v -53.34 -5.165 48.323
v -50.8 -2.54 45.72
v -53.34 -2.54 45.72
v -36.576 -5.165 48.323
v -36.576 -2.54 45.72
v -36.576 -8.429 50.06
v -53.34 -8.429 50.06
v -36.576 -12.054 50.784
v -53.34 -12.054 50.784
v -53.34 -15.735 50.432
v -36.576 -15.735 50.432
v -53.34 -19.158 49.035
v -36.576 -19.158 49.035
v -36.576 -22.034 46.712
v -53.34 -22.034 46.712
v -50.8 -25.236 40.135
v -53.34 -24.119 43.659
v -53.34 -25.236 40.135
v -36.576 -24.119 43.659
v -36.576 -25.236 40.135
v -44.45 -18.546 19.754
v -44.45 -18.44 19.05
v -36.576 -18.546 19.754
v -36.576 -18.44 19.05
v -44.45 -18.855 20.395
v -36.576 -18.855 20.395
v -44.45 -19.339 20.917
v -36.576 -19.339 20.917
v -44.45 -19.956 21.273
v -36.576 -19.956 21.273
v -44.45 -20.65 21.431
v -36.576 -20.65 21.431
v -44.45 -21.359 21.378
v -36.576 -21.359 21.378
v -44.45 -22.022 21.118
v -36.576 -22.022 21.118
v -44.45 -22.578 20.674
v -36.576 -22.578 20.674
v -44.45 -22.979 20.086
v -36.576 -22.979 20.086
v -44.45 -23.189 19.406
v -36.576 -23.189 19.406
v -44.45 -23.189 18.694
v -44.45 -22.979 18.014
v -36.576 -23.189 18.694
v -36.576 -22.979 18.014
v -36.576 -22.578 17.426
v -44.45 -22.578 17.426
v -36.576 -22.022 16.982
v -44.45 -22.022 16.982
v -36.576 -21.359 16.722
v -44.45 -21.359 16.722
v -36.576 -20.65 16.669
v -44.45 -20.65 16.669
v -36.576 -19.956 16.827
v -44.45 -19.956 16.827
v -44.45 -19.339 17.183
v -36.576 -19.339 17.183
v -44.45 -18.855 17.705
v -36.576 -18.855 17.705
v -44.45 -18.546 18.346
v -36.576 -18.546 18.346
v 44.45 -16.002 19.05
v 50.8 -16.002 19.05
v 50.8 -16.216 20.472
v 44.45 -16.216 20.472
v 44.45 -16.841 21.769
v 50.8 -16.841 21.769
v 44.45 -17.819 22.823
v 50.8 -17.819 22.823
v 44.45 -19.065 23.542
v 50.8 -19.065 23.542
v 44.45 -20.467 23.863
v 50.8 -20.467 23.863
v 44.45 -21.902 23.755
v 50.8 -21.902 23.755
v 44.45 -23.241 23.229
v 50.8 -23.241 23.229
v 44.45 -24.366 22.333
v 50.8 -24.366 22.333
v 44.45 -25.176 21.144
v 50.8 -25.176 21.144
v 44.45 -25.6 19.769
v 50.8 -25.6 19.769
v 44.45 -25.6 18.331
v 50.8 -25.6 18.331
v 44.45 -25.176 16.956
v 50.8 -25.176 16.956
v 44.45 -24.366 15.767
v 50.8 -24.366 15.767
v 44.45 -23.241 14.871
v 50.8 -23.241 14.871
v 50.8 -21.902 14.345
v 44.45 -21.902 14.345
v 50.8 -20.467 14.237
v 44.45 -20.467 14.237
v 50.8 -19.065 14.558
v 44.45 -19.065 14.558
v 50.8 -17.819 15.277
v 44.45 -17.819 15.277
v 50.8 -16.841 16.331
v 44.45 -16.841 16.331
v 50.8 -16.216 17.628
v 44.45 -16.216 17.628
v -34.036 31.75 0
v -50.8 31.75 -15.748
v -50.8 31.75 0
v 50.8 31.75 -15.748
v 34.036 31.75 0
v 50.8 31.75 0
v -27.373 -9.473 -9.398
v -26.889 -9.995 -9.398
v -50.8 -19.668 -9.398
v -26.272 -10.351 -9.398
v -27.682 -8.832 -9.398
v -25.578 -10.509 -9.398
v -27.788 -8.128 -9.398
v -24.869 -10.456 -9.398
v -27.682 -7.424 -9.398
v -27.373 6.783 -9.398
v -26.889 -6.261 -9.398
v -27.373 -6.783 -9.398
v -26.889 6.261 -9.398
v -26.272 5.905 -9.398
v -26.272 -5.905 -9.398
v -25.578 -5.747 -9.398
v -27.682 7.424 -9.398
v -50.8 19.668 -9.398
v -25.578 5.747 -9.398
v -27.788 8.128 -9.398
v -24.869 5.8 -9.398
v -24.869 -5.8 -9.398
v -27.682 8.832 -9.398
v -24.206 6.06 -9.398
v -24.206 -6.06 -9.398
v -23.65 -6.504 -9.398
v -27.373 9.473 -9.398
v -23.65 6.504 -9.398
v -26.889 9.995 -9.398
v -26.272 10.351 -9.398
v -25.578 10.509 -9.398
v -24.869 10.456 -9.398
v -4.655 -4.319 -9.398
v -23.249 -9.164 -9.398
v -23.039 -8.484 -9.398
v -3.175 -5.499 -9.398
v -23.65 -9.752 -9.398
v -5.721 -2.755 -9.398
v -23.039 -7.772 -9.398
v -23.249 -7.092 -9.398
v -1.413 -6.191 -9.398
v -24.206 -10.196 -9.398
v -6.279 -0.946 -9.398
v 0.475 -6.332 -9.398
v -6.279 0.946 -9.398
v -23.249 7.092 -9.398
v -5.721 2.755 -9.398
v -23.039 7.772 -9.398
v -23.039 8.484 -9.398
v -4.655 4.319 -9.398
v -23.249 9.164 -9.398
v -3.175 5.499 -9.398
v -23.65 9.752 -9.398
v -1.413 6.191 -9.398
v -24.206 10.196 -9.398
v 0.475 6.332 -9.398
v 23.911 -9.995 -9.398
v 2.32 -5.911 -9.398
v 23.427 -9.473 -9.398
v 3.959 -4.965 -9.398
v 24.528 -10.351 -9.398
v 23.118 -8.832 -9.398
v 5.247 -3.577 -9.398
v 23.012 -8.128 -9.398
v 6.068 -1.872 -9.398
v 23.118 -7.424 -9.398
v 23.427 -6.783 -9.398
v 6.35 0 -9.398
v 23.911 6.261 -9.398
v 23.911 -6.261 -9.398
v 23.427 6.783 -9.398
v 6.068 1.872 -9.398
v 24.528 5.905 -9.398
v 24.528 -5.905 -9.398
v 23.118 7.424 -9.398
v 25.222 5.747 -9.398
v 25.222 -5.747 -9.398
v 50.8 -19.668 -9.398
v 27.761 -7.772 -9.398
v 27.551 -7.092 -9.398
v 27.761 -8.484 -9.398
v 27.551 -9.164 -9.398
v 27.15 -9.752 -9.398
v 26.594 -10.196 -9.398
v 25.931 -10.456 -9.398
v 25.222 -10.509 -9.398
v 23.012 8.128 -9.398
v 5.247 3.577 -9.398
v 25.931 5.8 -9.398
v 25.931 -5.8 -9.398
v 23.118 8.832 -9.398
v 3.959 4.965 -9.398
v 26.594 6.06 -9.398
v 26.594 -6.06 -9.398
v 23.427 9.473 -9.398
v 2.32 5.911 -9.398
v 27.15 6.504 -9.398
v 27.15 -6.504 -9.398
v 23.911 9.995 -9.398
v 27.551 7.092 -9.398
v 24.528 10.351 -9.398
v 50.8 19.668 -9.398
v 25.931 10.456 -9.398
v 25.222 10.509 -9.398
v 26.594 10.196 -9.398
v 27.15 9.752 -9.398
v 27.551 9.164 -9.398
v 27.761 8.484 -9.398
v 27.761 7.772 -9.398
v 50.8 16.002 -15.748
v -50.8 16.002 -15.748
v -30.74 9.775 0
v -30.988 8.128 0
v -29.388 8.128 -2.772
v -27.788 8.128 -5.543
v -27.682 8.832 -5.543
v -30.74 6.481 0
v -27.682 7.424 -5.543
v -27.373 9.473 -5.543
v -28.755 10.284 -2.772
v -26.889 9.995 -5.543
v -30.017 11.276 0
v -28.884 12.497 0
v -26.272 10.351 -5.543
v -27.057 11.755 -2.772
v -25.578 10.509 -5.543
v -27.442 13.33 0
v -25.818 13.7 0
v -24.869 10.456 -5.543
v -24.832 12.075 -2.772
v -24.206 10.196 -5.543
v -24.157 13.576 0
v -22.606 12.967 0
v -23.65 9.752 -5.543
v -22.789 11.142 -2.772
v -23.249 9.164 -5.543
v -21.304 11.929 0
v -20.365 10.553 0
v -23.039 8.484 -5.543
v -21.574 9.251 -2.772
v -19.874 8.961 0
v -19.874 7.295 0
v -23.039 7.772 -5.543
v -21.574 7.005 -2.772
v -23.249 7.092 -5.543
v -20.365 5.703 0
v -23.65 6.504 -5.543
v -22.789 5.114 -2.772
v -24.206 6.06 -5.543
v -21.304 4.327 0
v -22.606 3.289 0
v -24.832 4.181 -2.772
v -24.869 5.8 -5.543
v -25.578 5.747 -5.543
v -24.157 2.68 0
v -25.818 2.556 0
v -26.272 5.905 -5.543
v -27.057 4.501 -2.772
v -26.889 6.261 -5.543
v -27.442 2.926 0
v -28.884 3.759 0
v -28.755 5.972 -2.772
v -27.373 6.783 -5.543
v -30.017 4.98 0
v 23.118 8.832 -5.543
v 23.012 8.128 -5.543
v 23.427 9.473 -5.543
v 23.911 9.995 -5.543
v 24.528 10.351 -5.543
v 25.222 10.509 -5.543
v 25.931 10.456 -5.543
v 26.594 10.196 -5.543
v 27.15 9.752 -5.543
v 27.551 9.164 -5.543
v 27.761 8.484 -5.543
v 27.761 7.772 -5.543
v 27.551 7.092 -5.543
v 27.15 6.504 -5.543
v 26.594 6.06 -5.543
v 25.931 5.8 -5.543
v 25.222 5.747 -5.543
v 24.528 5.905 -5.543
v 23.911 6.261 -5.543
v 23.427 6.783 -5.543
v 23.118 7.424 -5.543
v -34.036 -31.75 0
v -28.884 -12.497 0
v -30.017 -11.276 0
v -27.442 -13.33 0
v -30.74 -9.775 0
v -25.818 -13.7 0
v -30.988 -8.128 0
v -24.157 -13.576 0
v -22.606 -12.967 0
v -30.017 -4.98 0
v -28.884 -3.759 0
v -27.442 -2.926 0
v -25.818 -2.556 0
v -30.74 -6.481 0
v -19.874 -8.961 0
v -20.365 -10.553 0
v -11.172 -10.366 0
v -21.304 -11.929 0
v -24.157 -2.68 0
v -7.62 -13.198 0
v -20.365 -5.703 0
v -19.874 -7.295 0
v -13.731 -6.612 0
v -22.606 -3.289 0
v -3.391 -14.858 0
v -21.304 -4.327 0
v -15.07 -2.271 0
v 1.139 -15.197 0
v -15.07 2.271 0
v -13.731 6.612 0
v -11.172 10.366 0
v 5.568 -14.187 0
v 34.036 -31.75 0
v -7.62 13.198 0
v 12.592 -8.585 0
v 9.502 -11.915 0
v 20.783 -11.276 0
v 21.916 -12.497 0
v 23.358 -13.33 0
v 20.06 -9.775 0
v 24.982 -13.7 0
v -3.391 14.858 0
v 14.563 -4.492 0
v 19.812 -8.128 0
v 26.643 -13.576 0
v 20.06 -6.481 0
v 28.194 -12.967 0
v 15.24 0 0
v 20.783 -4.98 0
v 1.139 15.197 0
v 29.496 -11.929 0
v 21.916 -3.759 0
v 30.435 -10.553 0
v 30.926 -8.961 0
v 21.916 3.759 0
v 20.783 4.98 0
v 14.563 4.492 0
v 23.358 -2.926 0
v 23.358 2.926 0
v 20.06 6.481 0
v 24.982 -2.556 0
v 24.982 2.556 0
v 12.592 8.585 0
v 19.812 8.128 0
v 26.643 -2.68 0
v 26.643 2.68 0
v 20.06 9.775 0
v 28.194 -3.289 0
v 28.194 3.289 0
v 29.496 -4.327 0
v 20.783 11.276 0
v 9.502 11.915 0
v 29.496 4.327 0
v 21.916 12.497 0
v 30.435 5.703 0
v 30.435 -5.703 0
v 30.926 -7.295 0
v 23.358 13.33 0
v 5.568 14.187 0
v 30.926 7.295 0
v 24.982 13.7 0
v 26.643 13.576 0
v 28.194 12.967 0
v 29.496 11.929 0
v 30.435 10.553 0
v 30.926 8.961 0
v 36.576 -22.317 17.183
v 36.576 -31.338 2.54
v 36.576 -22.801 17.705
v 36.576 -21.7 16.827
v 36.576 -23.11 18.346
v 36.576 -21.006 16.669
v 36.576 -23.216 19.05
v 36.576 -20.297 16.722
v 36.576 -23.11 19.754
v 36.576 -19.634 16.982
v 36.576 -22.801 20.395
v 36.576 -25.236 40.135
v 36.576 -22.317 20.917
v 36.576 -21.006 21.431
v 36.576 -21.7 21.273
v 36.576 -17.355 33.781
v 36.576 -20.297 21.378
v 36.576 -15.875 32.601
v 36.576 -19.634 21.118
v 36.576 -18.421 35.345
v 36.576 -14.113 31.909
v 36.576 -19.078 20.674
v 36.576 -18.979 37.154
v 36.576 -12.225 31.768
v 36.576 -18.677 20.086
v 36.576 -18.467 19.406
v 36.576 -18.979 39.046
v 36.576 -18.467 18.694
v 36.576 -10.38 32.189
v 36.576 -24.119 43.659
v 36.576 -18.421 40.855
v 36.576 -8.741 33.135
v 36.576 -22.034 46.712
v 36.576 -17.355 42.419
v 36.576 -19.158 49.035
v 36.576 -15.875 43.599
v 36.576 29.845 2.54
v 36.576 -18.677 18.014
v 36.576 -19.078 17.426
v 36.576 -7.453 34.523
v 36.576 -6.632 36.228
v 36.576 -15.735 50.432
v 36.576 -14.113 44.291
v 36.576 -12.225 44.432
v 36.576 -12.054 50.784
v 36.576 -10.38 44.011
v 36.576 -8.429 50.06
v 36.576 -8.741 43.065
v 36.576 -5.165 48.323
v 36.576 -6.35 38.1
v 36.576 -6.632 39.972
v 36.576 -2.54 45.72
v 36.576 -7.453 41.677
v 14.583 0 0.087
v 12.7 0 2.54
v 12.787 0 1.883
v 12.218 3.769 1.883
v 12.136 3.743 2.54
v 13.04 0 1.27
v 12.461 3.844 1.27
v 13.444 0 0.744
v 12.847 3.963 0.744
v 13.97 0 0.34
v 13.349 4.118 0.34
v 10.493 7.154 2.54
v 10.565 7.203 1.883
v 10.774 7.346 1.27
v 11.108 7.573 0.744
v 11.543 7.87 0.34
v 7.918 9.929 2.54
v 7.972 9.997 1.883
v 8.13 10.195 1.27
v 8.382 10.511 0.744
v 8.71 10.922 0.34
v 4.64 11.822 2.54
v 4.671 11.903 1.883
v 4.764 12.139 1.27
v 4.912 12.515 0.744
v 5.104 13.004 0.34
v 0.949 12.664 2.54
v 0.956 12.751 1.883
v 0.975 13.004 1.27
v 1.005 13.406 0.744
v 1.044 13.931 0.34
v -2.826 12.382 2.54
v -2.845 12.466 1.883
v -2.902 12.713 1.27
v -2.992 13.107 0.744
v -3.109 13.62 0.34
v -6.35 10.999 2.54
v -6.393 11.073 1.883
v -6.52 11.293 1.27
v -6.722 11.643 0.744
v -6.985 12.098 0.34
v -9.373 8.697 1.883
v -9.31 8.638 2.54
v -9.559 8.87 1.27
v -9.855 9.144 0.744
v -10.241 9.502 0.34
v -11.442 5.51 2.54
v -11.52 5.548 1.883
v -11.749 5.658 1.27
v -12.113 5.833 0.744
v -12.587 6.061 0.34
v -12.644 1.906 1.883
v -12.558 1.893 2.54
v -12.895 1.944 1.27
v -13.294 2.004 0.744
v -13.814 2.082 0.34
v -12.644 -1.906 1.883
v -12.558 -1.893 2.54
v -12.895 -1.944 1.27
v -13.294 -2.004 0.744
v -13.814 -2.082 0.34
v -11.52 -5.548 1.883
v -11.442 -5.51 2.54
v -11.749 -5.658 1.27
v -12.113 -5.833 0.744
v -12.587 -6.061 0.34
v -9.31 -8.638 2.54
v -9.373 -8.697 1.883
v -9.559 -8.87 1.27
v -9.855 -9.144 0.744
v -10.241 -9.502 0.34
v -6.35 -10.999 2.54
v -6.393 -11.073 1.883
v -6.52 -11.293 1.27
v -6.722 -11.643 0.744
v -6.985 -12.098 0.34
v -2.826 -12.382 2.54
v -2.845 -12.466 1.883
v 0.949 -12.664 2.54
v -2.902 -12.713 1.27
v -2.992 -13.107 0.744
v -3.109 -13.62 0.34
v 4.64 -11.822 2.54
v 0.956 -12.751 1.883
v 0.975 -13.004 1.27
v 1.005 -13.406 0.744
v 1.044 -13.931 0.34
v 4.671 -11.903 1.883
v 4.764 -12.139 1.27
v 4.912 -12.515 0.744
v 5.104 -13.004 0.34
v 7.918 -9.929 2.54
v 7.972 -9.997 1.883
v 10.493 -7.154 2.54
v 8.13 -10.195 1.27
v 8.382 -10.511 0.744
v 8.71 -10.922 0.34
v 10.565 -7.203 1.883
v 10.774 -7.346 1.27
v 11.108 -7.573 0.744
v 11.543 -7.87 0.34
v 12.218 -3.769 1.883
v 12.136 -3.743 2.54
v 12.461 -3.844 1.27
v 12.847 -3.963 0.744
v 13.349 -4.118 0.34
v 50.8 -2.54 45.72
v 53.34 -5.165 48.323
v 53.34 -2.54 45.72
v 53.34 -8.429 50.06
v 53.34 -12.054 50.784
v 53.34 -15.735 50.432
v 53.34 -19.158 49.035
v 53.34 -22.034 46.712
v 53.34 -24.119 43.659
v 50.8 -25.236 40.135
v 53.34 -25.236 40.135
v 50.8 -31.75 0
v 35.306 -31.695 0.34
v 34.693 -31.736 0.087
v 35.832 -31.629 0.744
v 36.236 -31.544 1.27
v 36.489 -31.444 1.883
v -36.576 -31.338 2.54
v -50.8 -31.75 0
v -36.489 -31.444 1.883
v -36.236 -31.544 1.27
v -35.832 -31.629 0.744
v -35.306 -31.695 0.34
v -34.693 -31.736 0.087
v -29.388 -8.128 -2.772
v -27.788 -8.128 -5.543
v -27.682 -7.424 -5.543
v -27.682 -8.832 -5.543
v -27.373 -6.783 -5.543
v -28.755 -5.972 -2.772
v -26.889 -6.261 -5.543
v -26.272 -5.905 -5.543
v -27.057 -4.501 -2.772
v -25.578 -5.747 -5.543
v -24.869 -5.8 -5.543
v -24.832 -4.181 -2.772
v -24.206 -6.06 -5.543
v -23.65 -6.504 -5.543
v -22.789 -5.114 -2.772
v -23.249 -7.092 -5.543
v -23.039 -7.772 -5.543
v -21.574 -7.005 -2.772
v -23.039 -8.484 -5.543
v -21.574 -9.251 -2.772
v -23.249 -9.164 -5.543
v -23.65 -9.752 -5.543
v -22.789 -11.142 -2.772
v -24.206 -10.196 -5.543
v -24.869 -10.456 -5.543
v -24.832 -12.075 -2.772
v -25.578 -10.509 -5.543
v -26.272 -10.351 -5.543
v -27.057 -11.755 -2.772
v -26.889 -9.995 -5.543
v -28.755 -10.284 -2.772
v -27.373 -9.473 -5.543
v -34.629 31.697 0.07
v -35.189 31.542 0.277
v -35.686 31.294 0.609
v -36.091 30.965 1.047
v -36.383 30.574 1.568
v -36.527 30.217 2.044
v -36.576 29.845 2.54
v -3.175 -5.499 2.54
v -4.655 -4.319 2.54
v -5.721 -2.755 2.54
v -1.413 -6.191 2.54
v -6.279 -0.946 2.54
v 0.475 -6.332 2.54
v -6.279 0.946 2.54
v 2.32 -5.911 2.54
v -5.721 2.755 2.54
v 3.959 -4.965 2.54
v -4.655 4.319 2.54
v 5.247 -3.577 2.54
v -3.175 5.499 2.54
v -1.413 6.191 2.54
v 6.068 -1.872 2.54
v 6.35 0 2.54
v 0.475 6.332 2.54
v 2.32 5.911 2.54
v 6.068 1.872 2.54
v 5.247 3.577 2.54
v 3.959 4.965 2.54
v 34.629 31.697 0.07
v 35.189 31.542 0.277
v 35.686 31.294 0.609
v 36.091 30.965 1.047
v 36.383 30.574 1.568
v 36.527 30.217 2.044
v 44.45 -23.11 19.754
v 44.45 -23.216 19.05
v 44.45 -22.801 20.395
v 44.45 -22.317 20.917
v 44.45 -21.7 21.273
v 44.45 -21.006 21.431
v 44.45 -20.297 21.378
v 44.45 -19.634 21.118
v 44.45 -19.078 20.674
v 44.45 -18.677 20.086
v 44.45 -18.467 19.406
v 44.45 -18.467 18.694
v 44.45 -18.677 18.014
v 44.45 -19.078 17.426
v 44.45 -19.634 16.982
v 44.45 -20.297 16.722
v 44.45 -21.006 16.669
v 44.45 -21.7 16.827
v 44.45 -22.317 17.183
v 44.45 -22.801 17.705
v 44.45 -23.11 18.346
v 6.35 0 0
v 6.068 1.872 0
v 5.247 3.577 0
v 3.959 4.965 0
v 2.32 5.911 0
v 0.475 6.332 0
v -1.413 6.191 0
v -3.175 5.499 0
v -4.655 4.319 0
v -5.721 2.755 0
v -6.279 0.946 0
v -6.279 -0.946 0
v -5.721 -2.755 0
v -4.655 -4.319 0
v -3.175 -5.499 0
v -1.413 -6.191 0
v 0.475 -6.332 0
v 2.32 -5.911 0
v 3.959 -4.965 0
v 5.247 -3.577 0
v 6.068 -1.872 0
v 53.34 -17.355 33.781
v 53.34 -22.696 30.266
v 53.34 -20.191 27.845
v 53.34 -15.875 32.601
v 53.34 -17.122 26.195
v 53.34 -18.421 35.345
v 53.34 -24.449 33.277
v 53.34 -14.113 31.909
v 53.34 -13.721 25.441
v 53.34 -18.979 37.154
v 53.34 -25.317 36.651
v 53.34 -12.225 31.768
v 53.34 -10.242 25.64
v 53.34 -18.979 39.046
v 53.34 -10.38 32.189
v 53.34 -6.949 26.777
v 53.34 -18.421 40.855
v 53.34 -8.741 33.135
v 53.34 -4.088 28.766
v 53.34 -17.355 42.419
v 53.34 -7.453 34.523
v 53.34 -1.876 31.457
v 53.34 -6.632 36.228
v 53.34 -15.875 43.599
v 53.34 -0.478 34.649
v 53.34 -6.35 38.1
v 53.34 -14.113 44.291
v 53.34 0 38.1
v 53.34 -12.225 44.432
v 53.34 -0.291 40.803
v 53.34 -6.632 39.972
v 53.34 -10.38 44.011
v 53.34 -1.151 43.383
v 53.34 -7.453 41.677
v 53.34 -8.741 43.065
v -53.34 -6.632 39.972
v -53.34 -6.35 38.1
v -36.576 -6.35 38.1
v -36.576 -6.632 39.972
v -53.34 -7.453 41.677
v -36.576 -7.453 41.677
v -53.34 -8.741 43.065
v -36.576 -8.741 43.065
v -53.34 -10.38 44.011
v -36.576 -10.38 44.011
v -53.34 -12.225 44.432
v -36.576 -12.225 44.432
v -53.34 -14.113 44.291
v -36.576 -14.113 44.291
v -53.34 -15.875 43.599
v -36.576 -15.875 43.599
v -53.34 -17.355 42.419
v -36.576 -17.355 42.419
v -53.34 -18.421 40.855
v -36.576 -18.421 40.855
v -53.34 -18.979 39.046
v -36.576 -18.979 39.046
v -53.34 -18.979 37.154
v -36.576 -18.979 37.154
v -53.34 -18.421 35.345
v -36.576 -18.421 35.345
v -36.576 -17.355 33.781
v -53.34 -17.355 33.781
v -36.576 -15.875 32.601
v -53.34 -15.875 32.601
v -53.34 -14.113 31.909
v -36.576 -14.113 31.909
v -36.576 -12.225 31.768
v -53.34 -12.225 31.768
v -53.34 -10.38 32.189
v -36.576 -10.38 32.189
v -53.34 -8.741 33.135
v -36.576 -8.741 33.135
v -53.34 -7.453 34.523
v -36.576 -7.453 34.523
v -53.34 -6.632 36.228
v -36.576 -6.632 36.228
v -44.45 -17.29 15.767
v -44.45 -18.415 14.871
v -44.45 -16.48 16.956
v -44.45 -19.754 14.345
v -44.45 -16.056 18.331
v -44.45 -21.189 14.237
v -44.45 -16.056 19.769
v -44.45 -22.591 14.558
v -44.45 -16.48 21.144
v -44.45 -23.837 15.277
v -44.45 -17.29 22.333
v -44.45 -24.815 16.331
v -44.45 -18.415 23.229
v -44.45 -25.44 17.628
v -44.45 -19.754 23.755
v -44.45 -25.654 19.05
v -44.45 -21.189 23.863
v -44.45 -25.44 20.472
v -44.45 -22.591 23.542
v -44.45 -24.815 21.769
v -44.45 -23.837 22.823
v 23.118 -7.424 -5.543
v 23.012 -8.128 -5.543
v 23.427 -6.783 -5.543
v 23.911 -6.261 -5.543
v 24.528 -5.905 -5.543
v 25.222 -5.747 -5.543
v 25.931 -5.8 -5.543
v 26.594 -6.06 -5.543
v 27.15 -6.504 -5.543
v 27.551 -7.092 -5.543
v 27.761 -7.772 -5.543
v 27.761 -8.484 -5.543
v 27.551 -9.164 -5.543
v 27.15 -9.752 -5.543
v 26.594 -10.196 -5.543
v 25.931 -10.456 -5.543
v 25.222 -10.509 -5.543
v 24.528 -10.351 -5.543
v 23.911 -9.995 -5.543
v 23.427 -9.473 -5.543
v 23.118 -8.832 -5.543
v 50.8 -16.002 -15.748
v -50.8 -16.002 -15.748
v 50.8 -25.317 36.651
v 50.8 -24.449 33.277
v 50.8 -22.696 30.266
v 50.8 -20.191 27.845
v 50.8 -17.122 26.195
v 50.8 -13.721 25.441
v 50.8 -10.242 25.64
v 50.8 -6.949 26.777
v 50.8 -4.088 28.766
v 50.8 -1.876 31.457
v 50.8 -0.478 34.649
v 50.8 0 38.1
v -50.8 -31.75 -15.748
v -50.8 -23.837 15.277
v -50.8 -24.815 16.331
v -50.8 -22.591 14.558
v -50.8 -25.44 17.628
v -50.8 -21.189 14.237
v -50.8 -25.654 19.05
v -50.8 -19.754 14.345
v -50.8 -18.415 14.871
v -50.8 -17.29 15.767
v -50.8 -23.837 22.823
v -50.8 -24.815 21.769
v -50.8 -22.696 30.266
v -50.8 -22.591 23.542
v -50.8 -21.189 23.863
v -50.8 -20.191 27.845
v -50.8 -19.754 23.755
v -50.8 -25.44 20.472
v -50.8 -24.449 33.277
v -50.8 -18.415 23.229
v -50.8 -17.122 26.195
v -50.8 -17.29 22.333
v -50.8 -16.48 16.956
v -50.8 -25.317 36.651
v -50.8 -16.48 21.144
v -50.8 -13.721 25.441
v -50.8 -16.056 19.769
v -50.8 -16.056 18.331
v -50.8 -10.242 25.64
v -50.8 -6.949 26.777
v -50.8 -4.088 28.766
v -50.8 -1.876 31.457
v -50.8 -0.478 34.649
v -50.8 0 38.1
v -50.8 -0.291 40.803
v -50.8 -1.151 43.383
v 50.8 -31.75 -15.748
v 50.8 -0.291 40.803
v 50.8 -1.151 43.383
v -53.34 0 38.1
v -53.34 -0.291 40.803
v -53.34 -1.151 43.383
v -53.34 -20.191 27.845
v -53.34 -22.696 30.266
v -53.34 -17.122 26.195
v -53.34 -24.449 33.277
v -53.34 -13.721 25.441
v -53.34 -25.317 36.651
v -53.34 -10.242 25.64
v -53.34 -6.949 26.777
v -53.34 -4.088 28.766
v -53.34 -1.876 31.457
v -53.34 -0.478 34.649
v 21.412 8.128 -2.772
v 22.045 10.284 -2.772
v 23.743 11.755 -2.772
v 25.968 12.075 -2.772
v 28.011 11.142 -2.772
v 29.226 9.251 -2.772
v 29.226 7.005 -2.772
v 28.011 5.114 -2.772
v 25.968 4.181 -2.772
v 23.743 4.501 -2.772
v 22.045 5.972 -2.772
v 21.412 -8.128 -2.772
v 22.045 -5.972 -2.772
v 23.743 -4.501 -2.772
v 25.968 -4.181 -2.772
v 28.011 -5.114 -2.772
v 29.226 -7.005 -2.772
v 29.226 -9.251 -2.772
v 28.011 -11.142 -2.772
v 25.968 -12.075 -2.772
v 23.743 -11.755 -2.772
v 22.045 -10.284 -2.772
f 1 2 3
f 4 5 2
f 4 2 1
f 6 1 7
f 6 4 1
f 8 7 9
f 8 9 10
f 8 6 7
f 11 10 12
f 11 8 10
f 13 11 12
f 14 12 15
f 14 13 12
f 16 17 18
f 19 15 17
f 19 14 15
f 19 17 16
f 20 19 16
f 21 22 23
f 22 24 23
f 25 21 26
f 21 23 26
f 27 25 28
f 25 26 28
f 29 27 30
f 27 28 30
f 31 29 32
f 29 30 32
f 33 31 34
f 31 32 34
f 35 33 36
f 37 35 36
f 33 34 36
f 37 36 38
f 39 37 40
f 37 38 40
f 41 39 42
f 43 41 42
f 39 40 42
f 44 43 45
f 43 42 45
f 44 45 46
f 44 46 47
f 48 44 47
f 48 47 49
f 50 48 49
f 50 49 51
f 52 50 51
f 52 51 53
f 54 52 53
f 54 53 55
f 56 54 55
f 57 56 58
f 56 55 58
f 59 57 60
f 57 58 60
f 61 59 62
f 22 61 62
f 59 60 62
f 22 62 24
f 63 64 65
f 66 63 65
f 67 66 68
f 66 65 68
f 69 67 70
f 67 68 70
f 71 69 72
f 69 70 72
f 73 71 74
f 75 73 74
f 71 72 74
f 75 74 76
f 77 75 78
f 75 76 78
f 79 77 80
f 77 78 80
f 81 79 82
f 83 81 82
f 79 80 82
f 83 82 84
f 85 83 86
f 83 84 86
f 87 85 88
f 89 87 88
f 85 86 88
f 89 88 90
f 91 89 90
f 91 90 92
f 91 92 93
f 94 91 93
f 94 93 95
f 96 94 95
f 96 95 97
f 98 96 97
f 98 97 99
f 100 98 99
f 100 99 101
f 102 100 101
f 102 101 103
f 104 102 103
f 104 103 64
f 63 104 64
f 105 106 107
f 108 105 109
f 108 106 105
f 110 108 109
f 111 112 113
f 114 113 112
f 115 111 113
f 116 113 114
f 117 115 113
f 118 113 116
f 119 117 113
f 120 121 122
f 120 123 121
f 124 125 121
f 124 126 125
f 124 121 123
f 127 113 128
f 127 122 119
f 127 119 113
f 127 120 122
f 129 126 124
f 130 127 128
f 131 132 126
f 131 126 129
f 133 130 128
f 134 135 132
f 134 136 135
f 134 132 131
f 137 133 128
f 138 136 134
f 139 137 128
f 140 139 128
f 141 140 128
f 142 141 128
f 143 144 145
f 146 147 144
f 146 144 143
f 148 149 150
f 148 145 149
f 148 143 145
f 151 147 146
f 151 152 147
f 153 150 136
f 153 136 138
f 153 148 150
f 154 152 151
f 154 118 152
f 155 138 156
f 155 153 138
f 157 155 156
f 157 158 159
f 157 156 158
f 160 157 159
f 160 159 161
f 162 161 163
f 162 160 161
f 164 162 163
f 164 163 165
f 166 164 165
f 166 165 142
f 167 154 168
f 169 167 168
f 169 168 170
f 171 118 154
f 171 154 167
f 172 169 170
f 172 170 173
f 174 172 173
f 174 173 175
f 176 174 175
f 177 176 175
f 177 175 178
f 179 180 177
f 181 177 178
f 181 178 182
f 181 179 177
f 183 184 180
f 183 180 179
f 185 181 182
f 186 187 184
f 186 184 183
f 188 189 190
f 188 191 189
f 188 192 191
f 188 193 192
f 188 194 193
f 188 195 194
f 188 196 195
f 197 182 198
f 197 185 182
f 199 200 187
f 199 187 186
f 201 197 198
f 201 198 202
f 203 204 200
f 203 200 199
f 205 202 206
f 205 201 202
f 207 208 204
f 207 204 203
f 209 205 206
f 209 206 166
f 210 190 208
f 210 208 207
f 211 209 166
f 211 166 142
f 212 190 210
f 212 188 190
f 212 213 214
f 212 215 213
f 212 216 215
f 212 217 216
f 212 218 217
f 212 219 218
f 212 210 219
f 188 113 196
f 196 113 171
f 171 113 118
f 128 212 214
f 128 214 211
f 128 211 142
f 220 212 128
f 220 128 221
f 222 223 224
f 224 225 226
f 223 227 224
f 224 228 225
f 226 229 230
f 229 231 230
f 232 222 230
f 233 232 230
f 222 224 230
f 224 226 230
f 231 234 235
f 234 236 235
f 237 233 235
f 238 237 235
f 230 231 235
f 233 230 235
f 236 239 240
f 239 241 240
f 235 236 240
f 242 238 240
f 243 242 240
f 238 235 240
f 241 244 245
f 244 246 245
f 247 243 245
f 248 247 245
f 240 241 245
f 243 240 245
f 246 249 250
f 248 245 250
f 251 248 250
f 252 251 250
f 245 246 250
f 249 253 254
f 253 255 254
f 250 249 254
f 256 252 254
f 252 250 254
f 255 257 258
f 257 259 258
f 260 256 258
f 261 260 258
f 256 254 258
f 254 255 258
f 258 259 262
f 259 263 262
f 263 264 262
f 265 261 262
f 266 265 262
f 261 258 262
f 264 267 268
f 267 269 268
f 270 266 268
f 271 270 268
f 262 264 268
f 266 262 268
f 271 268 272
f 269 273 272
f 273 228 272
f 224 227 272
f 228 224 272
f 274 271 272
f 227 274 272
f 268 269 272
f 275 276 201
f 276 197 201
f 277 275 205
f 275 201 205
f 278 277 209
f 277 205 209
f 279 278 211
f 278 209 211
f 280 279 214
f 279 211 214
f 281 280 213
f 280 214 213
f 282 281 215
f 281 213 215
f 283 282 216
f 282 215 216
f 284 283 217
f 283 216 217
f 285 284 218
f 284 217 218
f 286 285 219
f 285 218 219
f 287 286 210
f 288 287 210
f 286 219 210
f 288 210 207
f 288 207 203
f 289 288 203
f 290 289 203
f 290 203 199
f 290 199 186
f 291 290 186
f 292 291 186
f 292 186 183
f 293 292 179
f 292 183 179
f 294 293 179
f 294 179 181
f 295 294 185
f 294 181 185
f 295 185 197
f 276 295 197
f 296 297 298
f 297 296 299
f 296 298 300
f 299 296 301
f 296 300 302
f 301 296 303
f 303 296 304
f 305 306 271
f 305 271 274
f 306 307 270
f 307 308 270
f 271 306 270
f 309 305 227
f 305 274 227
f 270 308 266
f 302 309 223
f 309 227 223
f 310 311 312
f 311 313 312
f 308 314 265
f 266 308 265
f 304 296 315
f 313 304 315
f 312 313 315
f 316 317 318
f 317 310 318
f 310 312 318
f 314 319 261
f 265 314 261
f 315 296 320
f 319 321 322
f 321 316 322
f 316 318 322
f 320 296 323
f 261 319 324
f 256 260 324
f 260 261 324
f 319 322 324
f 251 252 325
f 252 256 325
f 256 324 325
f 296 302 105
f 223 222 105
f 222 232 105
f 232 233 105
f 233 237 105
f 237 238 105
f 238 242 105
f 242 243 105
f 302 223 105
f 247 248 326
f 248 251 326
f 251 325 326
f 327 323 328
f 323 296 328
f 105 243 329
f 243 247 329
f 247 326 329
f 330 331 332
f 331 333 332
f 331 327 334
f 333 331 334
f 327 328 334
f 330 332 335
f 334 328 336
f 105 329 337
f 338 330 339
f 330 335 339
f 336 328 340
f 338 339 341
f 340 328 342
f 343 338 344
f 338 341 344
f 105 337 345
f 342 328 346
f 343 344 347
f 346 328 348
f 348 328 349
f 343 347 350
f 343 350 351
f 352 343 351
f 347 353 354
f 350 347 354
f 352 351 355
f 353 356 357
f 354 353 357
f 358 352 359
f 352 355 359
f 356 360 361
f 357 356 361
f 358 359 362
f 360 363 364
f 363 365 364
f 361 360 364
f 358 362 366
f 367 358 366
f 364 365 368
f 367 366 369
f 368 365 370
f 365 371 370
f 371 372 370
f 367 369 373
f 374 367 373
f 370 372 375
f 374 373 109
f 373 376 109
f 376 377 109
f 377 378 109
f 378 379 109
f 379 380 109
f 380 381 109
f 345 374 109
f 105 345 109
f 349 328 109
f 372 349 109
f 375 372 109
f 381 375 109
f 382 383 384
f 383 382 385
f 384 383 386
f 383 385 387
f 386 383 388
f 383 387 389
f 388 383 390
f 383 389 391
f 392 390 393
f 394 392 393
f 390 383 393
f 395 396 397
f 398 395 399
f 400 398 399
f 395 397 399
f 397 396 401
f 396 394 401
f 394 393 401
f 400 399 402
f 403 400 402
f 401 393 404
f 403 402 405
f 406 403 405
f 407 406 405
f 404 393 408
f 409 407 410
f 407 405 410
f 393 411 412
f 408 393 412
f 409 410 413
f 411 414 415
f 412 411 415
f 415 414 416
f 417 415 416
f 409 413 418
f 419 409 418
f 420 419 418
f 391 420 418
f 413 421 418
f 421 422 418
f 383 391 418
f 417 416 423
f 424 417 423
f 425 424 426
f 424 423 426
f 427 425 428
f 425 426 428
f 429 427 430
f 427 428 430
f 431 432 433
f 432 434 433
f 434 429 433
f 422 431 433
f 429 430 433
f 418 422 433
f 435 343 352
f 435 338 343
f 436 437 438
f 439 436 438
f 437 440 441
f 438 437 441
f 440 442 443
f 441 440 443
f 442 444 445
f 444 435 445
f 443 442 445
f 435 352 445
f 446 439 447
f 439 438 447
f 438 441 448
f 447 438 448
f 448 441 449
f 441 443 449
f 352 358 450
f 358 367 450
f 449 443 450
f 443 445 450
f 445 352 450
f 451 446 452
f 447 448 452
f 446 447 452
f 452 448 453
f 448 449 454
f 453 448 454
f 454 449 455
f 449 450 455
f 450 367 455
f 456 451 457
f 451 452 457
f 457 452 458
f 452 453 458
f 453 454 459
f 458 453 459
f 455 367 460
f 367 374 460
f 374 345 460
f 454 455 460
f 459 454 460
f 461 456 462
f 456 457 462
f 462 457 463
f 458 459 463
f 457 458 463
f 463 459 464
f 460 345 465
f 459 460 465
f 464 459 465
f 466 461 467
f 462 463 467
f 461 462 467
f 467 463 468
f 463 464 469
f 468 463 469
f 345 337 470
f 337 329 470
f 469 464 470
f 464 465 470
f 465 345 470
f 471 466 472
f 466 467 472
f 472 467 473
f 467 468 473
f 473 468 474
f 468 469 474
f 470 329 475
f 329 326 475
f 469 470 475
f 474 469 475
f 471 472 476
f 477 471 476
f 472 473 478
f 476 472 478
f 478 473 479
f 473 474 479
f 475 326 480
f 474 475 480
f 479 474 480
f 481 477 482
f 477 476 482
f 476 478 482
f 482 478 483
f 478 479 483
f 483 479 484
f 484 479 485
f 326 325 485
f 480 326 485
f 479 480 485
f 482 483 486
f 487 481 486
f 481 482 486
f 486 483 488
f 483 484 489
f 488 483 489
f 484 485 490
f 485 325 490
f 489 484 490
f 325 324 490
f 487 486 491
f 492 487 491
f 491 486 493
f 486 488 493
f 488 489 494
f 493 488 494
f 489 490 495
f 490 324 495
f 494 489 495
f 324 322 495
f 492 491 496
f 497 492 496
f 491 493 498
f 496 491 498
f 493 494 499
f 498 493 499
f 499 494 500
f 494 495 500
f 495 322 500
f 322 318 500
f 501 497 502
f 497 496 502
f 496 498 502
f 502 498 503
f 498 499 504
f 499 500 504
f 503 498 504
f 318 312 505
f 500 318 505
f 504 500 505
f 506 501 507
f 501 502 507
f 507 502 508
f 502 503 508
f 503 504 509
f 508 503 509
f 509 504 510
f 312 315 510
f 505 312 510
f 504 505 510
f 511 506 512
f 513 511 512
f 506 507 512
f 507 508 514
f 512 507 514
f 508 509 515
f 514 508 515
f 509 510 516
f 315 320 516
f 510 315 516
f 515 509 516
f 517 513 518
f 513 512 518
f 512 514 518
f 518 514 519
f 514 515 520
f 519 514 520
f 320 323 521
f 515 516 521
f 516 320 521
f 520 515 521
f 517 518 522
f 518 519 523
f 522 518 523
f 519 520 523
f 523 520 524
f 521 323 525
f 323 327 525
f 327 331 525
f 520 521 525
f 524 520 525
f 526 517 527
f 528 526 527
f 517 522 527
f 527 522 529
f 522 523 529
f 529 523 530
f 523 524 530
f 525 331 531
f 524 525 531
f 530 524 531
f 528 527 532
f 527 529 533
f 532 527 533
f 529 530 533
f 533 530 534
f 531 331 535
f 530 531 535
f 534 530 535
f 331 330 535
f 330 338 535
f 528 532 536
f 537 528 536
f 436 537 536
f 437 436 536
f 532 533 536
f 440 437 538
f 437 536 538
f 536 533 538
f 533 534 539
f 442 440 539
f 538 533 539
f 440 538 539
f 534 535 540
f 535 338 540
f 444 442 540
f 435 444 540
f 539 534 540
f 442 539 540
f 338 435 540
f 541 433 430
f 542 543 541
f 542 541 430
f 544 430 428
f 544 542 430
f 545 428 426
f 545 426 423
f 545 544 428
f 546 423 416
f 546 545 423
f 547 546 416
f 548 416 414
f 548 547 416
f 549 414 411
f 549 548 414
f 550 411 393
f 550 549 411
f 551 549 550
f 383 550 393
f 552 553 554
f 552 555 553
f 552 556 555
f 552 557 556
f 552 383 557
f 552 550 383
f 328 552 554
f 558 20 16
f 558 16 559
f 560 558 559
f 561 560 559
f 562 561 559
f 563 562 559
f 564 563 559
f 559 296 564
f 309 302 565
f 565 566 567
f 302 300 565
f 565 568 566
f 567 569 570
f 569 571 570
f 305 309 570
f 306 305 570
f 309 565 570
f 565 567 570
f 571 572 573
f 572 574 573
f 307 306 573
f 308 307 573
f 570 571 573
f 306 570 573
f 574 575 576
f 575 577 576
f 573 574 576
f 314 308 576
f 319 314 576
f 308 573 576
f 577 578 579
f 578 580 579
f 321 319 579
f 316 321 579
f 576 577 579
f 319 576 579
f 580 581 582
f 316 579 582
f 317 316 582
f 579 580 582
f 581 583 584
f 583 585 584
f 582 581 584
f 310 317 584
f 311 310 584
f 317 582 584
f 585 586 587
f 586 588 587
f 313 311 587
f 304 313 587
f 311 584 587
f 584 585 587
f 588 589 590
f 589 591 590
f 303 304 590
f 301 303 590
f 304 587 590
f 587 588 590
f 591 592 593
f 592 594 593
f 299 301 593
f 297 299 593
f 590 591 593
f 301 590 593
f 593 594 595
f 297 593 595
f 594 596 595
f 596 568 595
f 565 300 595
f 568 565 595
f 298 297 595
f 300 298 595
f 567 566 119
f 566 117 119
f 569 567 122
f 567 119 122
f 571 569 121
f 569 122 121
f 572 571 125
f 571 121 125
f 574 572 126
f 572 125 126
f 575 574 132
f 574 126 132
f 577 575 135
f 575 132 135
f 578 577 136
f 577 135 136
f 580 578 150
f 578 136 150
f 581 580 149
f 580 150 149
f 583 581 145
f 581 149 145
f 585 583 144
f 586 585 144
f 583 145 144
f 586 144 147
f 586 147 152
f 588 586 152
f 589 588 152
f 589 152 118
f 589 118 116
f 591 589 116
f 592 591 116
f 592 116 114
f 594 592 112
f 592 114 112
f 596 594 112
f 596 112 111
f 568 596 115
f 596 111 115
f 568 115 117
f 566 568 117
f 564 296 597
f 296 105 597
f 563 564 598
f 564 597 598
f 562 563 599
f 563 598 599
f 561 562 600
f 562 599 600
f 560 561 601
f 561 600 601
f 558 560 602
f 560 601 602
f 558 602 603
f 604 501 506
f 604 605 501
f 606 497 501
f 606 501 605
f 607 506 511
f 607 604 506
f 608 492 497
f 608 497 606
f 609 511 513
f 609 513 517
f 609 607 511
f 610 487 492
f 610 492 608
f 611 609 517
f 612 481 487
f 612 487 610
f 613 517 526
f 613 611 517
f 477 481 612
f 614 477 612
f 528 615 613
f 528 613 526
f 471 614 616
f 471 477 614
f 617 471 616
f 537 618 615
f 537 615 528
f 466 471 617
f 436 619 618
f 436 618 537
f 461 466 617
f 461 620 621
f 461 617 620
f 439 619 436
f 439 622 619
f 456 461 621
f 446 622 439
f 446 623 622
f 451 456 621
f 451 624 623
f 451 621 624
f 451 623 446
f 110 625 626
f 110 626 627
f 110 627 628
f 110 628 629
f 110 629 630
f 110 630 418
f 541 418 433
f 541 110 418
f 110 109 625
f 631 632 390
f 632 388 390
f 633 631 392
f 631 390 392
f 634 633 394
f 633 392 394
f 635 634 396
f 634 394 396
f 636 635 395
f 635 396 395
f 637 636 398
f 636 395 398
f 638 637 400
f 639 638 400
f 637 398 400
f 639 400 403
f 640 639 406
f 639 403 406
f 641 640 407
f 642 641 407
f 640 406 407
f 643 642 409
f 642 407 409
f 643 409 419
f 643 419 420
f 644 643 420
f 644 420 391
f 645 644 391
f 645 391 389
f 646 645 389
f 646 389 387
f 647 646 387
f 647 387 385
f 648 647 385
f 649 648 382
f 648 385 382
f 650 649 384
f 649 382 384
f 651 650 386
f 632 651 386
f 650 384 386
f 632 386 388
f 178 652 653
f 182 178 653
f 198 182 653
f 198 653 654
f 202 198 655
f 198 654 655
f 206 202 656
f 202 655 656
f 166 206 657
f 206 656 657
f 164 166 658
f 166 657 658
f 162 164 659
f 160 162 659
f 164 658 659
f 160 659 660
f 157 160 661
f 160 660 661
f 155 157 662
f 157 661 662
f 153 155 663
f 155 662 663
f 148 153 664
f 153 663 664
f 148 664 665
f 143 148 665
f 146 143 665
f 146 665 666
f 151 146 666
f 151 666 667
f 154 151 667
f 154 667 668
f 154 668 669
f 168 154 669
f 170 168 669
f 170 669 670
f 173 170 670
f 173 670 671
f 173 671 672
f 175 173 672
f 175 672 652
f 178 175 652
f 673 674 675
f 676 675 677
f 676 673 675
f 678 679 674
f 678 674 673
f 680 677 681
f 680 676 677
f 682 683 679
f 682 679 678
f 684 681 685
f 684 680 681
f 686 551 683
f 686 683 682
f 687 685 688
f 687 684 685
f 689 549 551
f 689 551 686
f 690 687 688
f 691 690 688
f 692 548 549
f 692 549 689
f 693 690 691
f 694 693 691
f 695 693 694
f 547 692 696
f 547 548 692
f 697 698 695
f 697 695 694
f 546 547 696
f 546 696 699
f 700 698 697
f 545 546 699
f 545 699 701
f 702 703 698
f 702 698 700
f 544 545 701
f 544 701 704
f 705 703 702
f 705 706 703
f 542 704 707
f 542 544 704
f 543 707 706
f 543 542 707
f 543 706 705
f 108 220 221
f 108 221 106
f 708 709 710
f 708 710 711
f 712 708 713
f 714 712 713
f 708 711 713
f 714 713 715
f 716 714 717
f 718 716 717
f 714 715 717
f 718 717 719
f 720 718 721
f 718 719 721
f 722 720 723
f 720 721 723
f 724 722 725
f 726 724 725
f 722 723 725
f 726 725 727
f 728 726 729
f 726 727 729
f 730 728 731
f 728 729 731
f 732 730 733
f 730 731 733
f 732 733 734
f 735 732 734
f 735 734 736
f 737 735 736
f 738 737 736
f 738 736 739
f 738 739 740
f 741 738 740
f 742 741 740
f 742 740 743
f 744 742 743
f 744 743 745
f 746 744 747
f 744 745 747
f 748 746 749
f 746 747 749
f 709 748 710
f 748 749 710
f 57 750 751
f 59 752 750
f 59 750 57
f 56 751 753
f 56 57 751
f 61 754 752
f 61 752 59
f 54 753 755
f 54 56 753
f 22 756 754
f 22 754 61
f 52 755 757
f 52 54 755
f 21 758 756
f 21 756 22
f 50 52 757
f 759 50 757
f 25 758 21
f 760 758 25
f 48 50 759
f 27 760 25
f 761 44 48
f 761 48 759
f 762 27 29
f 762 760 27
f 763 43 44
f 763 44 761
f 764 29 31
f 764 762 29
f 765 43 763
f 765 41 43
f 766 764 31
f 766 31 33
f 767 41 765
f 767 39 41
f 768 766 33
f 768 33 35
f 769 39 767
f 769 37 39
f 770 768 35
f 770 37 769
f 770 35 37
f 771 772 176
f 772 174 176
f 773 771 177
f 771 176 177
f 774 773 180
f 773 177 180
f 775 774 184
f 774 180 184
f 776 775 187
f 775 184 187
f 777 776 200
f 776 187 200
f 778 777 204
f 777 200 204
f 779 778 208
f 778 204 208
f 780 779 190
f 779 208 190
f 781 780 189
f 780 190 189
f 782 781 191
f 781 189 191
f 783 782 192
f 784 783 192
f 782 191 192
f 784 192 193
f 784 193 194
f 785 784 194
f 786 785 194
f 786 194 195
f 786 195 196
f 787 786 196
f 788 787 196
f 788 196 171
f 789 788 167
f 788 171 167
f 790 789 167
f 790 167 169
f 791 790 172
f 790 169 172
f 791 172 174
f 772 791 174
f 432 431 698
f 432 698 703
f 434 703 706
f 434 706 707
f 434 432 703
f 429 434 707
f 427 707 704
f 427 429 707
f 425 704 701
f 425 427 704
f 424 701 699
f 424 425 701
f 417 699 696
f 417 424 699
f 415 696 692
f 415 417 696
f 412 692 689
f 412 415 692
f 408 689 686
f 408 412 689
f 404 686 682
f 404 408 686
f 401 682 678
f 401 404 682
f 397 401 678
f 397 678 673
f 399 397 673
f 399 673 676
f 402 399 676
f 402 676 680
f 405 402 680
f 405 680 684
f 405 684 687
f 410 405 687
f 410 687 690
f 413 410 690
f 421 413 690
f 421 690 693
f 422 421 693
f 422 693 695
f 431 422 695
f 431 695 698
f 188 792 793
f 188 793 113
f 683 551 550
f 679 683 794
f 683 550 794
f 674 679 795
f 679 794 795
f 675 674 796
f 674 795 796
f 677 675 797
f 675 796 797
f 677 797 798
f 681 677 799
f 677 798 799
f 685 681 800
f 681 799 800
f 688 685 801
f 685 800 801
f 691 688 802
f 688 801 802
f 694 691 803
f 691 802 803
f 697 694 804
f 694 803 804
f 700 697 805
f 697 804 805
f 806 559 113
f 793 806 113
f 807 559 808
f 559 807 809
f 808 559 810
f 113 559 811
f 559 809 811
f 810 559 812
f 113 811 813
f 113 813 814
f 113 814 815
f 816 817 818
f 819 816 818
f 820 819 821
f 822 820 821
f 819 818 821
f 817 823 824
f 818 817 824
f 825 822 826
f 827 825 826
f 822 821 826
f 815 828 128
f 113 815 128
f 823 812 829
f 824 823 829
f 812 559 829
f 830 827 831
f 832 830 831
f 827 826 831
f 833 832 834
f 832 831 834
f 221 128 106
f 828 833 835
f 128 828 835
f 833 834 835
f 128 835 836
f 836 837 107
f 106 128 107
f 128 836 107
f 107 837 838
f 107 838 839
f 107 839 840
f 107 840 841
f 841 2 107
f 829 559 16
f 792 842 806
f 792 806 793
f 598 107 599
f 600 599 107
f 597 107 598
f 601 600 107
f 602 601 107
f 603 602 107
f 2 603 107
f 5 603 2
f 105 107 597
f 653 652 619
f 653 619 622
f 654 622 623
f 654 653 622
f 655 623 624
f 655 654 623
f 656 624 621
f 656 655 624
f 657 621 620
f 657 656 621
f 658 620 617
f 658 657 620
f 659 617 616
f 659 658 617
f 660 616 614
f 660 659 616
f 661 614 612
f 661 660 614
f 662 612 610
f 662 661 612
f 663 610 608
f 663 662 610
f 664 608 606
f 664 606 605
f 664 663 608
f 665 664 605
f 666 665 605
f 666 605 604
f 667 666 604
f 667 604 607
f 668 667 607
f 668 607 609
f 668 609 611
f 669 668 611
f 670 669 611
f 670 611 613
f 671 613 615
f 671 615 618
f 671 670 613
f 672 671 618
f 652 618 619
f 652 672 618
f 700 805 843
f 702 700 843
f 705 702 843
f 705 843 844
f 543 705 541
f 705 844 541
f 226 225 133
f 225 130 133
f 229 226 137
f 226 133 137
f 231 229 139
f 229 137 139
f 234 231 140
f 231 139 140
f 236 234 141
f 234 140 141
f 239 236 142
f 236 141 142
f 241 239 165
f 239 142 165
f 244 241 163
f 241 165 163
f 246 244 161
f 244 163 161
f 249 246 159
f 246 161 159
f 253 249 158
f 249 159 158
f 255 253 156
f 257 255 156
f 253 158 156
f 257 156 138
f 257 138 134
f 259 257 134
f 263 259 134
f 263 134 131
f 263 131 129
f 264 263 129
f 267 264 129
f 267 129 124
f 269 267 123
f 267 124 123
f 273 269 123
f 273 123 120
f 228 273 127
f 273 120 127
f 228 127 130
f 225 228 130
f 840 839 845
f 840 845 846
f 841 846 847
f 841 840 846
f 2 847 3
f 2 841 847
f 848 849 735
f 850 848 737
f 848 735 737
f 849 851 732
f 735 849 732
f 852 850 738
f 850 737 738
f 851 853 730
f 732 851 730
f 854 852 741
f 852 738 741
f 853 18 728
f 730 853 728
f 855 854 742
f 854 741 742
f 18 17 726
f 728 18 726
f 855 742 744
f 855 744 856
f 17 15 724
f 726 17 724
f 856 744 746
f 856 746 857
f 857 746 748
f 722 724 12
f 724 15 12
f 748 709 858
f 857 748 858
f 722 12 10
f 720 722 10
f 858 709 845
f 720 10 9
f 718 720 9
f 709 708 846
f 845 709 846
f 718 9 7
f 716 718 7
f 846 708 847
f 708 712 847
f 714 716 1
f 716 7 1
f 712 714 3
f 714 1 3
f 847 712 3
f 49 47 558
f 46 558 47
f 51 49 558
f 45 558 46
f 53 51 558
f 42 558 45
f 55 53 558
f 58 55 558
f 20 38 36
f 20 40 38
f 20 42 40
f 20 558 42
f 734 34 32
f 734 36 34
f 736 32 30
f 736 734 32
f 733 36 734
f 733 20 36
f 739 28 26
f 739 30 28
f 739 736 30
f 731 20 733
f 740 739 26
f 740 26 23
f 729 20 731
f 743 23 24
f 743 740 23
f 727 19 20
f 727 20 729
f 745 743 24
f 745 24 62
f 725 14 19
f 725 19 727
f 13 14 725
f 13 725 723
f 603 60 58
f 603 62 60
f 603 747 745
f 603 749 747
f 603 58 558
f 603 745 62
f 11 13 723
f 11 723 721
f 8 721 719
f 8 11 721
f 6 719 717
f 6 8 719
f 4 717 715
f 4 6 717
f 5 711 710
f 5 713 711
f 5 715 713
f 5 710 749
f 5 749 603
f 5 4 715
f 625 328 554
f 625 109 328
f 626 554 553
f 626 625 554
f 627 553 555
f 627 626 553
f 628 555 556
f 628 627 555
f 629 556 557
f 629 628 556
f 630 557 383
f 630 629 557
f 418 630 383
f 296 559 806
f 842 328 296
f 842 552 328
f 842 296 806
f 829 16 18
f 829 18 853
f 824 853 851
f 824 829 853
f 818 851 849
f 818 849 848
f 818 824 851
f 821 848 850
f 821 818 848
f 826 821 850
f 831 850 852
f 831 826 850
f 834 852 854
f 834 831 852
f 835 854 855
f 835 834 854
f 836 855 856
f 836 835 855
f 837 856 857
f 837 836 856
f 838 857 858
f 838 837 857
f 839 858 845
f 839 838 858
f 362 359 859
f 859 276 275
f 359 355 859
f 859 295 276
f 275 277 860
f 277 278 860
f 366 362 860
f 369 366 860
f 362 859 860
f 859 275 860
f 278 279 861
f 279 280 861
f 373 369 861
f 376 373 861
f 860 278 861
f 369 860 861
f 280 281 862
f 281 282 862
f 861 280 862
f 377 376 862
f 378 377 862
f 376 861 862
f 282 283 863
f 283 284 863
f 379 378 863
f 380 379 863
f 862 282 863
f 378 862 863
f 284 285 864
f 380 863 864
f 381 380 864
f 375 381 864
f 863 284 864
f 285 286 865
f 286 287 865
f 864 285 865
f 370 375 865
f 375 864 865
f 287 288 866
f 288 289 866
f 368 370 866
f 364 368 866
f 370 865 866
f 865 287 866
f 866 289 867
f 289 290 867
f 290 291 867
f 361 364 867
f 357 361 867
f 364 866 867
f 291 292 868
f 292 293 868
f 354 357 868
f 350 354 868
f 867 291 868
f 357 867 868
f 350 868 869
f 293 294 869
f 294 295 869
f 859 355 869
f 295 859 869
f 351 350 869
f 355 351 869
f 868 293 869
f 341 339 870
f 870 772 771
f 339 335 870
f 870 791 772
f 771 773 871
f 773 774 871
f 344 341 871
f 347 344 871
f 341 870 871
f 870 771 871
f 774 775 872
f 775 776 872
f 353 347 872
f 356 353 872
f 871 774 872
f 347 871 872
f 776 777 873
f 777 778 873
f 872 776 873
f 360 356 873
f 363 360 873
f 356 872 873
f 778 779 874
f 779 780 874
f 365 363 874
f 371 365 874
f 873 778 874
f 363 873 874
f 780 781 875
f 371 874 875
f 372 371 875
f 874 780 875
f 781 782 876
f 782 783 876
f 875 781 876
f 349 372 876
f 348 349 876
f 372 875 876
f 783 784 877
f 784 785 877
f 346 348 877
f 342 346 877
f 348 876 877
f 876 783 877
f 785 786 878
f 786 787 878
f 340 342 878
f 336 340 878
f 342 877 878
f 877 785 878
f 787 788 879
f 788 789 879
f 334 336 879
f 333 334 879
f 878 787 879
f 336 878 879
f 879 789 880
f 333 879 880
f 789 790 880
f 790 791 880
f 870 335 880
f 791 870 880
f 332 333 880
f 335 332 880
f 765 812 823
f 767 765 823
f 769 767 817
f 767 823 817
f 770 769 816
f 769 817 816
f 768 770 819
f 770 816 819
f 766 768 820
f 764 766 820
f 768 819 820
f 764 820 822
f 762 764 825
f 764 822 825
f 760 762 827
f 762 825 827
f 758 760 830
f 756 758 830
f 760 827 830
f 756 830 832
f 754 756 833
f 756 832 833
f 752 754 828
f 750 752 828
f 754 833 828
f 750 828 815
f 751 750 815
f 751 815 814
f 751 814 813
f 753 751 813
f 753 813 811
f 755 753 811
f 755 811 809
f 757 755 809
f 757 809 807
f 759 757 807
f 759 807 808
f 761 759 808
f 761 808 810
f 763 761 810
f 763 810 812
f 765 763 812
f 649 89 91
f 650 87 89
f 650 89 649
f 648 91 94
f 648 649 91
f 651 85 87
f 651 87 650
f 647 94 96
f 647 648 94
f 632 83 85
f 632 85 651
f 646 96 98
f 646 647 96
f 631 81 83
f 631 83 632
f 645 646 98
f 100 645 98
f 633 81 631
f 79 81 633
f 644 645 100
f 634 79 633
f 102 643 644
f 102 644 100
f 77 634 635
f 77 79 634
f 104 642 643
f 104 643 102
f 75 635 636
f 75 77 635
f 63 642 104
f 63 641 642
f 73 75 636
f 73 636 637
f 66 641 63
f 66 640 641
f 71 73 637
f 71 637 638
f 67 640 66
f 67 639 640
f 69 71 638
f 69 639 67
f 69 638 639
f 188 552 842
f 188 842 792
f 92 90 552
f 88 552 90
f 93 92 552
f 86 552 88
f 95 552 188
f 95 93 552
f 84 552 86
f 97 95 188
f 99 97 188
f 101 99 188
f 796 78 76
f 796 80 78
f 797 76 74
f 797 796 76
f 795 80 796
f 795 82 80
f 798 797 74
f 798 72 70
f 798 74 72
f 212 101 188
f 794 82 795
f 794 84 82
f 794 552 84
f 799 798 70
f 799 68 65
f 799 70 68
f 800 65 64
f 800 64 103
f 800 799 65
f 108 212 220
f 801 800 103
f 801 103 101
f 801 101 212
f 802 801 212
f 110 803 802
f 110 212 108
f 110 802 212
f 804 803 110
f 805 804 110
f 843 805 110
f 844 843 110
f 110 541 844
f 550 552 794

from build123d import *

# Parameters (mm, degrees)
F0_R            = 6.35
F1_DEPTH        = 50.8
F2_DEPTH        = 53.34
F3_DEPTH        = 36.576
F5_D            = 4.7752
F5_CSINK_D      = 11.176
F5_CSINK_ANGLE  = 60
F4_R            = 6.35
F6_DEPTH        = 25.4
F4_R_2          = 12.7
F7_DEPTH        = 2.54
F8_R            = 2.53999
F10_D           = 4.7752
F10_DEPTH       = 25.4
F10_CBORE_D     = 9.652
F10_CBORE_DEPTH = 6.35
F10_TIP         = 1.434614814
F12_D           = 4.7752
F12_DEPTH       = 25.4
F12_CBORE_D     = 9.652
F12_CBORE_DEPTH = 6.35
F12_TIP         = 1.434614814


# Not quite as in the source:
# - a fillet or chamfer is up to 0.001 mm smaller than in the source, because OpenCascade refuses the exact size


with BuildPart() as f1:
    # F0 (on Right) → F1 (new body, symmetric)
    with BuildSketch(Plane.YZ):
        with BuildLine():
            ThreePointArc((-25.2359570421, 40.1346451877), (-13.7206237225, 25.44107717), (0, 38.1))
            ThreePointArc((0, 38.1), (-0.6517221148, 42.1160926284), (-2.54, 45.72))
            ThreePointArc((-2.54, 45.72), (-15.7348542076, 50.4320582199), (-25.2359570421, 40.1346451877))
        make_face()
        with Locations((-12.7, 38.1)):
            Circle(F0_R, mode=Mode.SUBTRACT)
        with BuildLine():
            ThreePointArc((-2.54, 45.72), (-0.6517221148, 42.1160926284), (0, 38.1))
            ThreePointArc((0, 38.1), (-13.7206237225, 25.44107717), (-25.2359570421, 40.1346451877))
            Line((-25.2359570421, 40.1346451877), (-31.75, 0))
            Line((-31.75, 0), (31.75, 0))
            Line((31.75, 0), (-2.54, 45.72))
        make_face()
        Polygon((31.75, -15.748), (31.75, 0), (-31.75, 0), (-31.75, -15.748), (-16.002, -15.748), (-19.6681742094, -9.398), (19.6681742094, -9.398), (16.002, -15.748), align=None)
    extrude(amount=F1_DEPTH, both=True)

    # F0 (on Right) → F2 (join, symmetric)
    with BuildSketch(Plane.YZ):
        with BuildLine():
            ThreePointArc((-25.2359570421, 40.1346451877), (-13.7206237225, 25.44107717), (0, 38.1))
            ThreePointArc((0, 38.1), (-0.6517221148, 42.1160926284), (-2.54, 45.72))
            ThreePointArc((-2.54, 45.72), (-15.7348542076, 50.4320582199), (-25.2359570421, 40.1346451877))
        make_face()
        with Locations((-12.7, 38.1)):
            Circle(F0_R, mode=Mode.SUBTRACT)
    extrude(amount=F2_DEPTH, both=True)

    # F0 (on Right) → F3 (cut, symmetric)
    with BuildSketch(Plane.YZ):
        with BuildLine():
            ThreePointArc((-2.54, 45.72), (-0.6517221148, 42.1160926284), (0, 38.1))
            ThreePointArc((0, 38.1), (-13.7206237225, 25.44107717), (-25.2359570421, 40.1346451877))
            Line((-25.2359570421, 40.1346451877), (-31.75, 0))
            Line((-31.75, 0), (31.75, 0))
            Line((31.75, 0), (-2.54, 45.72))
        make_face()
        with BuildLine():
            ThreePointArc((-25.2359570421, 40.1346451877), (-13.7206237225, 25.44107717), (0, 38.1))
            ThreePointArc((0, 38.1), (-0.6517221148, 42.1160926284), (-2.54, 45.72))
            ThreePointArc((-2.54, 45.72), (-15.7348542076, 50.4320582199), (-25.2359570421, 40.1346451877))
        make_face()
        with Locations((-12.7, 38.1)):
            Circle(F0_R, mode=Mode.SUBTRACT)
    extrude(amount=F3_DEPTH, both=True, mode=Mode.SUBTRACT)

    # F5 (through all)
    with Locations(Plane.XY):
        with Locations((-25.4, 8.128), (-25.4, -8.128), (25.4, 8.128), (25.4, -8.128)):
            CounterSinkHole(F5_D / 2, F5_CSINK_D / 2, counter_sink_angle=F5_CSINK_ANGLE)

    # F4 (on face) → F6 (cut)
    with BuildSketch(Plane.XY):
        Circle(F4_R)
    extrude(amount=-F6_DEPTH, mode=Mode.SUBTRACT)

    # F4 (on face) → F7 (join)
    with BuildSketch(Plane.XY):
        Circle(F4_R_2)
        Circle(F4_R, mode=Mode.SUBTRACT)
    extrude(amount=F7_DEPTH)

    # F8 (radius 2.54 in the source; OpenCascade refuses exactly that, so slightly less here)
    f8_edges = [f1.edges().sort_by_distance(p)[0] for p in [
        (-12.7, 0, 0),
        (36.576, 0, 0),
        (-36.576, 0, 0),
    ]]
    fillet(f8_edges, radius=F8_R)

    # F10
    with Locations(Plane.YZ.offset(50.8)):
        with Locations((-20.828, 19.05)):
            CounterBoreHole(F10_D / 2, F10_CBORE_D / 2, F10_CBORE_DEPTH, depth=F10_DEPTH)
            with Locations((0, 0, -(F10_DEPTH + F10_TIP / 2))):  # 118° drill point
                Cone(0, F10_D / 2, F10_TIP, mode=Mode.SUBTRACT)

    # F12
    with Locations(Plane(origin=(-50.8, 0, 0), x_dir=(0, -1, 0), z_dir=(-1, 0, 0))):
        with Locations((20.828, 19.05)):
            CounterBoreHole(F12_D / 2, F12_CBORE_D / 2, F12_CBORE_DEPTH, depth=F12_DEPTH)
            with Locations((0, 0, -(F12_DEPTH + F12_TIP / 2))):  # 118° drill point
                Cone(0, F12_D / 2, F12_TIP, mode=Mode.SUBTRACT)


solid = f1.part
